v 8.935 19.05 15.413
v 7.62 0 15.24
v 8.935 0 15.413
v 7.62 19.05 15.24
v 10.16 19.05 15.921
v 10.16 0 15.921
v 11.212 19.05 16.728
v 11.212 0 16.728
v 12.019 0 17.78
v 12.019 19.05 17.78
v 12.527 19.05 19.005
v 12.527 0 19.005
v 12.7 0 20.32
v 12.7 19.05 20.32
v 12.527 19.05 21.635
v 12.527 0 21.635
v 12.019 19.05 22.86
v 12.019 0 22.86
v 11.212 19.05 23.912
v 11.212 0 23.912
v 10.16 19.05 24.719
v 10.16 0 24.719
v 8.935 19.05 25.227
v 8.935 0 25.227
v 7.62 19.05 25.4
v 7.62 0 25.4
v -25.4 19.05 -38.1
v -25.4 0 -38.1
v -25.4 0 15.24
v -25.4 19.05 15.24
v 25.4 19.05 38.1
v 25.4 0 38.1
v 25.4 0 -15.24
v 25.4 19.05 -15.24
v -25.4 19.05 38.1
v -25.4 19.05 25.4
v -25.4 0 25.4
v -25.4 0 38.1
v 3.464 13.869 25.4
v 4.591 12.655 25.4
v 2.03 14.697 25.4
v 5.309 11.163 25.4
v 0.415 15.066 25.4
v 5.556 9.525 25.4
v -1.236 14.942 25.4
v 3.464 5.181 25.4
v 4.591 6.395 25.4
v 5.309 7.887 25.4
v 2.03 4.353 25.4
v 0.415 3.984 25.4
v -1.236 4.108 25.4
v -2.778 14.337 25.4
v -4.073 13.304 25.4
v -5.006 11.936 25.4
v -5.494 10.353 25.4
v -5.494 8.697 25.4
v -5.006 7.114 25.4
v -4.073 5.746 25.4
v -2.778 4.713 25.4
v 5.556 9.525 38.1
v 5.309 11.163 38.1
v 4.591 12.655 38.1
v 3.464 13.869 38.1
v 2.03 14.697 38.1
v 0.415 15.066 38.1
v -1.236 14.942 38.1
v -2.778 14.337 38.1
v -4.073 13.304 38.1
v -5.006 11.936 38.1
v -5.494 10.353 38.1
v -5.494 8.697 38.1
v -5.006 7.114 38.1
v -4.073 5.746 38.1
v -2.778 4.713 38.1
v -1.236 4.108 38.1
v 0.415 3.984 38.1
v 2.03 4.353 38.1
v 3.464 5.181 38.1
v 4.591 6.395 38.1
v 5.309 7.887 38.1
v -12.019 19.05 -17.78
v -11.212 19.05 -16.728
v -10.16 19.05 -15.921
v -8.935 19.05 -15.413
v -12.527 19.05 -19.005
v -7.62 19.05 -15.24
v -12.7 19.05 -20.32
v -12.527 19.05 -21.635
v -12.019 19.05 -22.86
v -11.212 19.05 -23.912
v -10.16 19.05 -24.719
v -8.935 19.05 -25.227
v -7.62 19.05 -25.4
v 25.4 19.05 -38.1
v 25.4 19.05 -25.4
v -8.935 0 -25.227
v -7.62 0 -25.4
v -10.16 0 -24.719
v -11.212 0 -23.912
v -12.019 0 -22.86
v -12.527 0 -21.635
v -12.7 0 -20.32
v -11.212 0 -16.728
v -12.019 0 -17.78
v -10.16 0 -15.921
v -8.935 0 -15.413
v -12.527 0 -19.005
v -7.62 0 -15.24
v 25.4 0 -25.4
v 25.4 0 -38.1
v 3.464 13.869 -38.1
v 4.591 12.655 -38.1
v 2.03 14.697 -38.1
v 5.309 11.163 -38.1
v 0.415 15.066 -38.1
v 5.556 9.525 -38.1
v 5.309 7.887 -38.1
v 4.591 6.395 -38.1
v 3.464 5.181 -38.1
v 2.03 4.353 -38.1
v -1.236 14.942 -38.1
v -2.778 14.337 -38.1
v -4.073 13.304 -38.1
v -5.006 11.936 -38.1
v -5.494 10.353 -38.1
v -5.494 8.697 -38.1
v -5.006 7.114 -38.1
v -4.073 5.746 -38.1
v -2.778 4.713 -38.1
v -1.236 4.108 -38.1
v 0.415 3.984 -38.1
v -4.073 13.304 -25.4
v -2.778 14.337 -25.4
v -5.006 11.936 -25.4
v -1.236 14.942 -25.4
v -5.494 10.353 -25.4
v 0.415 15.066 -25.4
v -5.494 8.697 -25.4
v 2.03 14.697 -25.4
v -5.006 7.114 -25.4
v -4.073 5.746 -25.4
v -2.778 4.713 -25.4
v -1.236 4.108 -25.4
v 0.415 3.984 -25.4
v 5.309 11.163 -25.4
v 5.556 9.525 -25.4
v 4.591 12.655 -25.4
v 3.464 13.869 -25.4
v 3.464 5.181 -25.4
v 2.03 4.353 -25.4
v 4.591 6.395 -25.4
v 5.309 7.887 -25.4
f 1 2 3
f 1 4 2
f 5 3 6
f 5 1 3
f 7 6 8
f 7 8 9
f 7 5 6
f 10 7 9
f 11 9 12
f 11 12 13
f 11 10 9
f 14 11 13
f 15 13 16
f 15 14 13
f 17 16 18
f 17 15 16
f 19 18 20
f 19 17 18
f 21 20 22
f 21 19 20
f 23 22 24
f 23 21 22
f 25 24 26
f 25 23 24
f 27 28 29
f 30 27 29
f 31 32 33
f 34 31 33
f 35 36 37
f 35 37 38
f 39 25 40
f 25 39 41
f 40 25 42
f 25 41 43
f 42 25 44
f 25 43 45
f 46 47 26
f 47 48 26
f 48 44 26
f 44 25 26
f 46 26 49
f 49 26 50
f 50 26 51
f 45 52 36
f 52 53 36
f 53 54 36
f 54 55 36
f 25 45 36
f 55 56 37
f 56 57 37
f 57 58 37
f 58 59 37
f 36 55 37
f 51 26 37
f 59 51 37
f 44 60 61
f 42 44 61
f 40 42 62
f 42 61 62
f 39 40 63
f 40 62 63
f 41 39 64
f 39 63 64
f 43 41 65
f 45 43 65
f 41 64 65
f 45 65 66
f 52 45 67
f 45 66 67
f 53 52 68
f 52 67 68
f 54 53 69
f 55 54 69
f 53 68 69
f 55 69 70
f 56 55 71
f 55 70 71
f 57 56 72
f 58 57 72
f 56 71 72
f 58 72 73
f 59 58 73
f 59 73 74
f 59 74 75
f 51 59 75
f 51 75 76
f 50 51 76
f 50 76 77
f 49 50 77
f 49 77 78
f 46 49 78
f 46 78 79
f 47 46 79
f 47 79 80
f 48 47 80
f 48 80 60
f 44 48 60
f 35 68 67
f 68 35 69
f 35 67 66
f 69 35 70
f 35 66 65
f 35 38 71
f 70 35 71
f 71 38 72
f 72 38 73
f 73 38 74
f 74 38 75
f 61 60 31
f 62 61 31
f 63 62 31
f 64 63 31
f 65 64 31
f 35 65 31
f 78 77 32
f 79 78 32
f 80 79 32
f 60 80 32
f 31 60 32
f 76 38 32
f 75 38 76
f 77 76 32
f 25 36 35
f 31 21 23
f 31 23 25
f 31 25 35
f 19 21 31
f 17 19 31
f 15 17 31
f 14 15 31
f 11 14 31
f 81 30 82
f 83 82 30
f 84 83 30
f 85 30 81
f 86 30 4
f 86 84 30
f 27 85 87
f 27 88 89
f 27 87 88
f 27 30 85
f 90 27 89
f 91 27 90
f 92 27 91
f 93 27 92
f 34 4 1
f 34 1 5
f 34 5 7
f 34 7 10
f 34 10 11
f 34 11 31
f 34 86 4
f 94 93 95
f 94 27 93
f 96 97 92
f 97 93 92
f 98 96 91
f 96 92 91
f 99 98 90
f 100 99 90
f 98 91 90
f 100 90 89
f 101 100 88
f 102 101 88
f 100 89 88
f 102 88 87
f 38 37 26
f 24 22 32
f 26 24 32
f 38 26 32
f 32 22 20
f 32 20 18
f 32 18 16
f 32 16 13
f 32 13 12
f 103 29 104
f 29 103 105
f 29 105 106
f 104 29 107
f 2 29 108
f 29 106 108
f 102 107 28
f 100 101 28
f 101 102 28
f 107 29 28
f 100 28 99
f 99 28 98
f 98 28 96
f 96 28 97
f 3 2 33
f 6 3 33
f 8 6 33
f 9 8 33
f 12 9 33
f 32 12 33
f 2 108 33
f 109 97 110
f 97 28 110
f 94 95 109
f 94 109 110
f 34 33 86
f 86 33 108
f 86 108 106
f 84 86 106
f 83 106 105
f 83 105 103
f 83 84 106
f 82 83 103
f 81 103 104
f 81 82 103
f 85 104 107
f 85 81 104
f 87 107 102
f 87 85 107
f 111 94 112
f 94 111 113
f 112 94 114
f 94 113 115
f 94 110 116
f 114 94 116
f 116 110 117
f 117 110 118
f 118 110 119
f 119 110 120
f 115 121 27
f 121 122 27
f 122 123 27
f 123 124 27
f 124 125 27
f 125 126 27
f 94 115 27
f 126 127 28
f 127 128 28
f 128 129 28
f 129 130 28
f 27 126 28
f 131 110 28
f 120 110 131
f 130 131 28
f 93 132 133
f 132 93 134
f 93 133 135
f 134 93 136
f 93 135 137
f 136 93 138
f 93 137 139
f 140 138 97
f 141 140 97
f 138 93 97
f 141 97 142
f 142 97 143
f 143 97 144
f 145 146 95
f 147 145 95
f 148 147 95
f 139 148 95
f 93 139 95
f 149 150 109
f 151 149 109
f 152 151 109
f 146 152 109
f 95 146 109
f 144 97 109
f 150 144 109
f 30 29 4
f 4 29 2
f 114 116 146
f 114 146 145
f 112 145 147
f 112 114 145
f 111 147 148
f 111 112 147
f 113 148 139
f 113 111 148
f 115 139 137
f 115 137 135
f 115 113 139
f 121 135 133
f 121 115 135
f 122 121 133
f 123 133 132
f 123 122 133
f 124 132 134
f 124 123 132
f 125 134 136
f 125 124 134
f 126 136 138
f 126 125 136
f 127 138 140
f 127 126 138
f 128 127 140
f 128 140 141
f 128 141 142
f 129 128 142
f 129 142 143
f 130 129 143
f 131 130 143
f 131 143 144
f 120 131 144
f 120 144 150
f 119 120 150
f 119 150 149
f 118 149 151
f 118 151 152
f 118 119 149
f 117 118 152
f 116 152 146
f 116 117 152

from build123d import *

# Parameters (mm, degrees)
BOSS_EXTRUDE1_DEPTH = 19.05
FILLET1_R           = 5.08
CUT_EXTRUDE1_REACH  = 84.55
SKETCH2_R           = 5.55625
CUT_EXTRUDE2_START  = -76.2
SKETCH2_2_R         = 5.55625
CUT_EXTRUDE2_DEPTH  = 12.7


with BuildPart() as part:
    # Sketch1 → Boss-Extrude1 (new body)
    with BuildSketch(Plane(origin=(0, 0, 0), x_dir=(1, 0, 0), z_dir=(0, 1, 0))):
        Polygon((-12.7, 25.4), (25.4, 25.4), (25.4, 38.1), (-25.4, 38.1), (-25.4, -15.24), (12.7, -15.24), (12.7, -25.4), (-25.4, -25.4), (-25.4, -38.1), (25.4, -38.1), (25.4, 15.24), (-12.7, 15.24), align=None)
    extrude(amount=BOSS_EXTRUDE1_DEPTH)

    # Fillet1
    fillet1_edges = [part.edges().sort_by_distance(p)[0] for p in [
        (12.7, 9.525, 25.4),
        (12.7, 9.525, 15.24),
        (-12.7, 9.525, -15.24),
        (-12.7, 9.525, -25.4),
    ]]
    fillet(fillet1_edges, radius=FILLET1_R - 0.0001)  # a hair under: the kernel refuses the full size

    # Sketch2 → Cut-Extrude1 (cut, up to next)
    with BuildSketch(Plane.XY.offset(38.1), mode=Mode.PRIVATE) as cut_extrude1_sk1:
        with Locations((0, 9.525)):
            Circle(SKETCH2_R)
    cut_extrude1_tool1 = extrude(cut_extrude1_sk1.sketch, amount=-CUT_EXTRUDE1_REACH, mode=Mode.PRIVATE) & part.part
    add(cut_extrude1_tool1.solids().sort_by_distance((0, 9.525, 38.1))[0], mode=Mode.SUBTRACT)

    # Sketch2<2> → Cut-Extrude2 (cut)
    with BuildSketch(Plane.XY.offset(38.1).offset(CUT_EXTRUDE2_START)):
        with Locations((0, 9.525)):
            Circle(SKETCH2_2_R)
    extrude(amount=CUT_EXTRUDE2_DEPTH, mode=Mode.SUBTRACT)


solid = part.part
